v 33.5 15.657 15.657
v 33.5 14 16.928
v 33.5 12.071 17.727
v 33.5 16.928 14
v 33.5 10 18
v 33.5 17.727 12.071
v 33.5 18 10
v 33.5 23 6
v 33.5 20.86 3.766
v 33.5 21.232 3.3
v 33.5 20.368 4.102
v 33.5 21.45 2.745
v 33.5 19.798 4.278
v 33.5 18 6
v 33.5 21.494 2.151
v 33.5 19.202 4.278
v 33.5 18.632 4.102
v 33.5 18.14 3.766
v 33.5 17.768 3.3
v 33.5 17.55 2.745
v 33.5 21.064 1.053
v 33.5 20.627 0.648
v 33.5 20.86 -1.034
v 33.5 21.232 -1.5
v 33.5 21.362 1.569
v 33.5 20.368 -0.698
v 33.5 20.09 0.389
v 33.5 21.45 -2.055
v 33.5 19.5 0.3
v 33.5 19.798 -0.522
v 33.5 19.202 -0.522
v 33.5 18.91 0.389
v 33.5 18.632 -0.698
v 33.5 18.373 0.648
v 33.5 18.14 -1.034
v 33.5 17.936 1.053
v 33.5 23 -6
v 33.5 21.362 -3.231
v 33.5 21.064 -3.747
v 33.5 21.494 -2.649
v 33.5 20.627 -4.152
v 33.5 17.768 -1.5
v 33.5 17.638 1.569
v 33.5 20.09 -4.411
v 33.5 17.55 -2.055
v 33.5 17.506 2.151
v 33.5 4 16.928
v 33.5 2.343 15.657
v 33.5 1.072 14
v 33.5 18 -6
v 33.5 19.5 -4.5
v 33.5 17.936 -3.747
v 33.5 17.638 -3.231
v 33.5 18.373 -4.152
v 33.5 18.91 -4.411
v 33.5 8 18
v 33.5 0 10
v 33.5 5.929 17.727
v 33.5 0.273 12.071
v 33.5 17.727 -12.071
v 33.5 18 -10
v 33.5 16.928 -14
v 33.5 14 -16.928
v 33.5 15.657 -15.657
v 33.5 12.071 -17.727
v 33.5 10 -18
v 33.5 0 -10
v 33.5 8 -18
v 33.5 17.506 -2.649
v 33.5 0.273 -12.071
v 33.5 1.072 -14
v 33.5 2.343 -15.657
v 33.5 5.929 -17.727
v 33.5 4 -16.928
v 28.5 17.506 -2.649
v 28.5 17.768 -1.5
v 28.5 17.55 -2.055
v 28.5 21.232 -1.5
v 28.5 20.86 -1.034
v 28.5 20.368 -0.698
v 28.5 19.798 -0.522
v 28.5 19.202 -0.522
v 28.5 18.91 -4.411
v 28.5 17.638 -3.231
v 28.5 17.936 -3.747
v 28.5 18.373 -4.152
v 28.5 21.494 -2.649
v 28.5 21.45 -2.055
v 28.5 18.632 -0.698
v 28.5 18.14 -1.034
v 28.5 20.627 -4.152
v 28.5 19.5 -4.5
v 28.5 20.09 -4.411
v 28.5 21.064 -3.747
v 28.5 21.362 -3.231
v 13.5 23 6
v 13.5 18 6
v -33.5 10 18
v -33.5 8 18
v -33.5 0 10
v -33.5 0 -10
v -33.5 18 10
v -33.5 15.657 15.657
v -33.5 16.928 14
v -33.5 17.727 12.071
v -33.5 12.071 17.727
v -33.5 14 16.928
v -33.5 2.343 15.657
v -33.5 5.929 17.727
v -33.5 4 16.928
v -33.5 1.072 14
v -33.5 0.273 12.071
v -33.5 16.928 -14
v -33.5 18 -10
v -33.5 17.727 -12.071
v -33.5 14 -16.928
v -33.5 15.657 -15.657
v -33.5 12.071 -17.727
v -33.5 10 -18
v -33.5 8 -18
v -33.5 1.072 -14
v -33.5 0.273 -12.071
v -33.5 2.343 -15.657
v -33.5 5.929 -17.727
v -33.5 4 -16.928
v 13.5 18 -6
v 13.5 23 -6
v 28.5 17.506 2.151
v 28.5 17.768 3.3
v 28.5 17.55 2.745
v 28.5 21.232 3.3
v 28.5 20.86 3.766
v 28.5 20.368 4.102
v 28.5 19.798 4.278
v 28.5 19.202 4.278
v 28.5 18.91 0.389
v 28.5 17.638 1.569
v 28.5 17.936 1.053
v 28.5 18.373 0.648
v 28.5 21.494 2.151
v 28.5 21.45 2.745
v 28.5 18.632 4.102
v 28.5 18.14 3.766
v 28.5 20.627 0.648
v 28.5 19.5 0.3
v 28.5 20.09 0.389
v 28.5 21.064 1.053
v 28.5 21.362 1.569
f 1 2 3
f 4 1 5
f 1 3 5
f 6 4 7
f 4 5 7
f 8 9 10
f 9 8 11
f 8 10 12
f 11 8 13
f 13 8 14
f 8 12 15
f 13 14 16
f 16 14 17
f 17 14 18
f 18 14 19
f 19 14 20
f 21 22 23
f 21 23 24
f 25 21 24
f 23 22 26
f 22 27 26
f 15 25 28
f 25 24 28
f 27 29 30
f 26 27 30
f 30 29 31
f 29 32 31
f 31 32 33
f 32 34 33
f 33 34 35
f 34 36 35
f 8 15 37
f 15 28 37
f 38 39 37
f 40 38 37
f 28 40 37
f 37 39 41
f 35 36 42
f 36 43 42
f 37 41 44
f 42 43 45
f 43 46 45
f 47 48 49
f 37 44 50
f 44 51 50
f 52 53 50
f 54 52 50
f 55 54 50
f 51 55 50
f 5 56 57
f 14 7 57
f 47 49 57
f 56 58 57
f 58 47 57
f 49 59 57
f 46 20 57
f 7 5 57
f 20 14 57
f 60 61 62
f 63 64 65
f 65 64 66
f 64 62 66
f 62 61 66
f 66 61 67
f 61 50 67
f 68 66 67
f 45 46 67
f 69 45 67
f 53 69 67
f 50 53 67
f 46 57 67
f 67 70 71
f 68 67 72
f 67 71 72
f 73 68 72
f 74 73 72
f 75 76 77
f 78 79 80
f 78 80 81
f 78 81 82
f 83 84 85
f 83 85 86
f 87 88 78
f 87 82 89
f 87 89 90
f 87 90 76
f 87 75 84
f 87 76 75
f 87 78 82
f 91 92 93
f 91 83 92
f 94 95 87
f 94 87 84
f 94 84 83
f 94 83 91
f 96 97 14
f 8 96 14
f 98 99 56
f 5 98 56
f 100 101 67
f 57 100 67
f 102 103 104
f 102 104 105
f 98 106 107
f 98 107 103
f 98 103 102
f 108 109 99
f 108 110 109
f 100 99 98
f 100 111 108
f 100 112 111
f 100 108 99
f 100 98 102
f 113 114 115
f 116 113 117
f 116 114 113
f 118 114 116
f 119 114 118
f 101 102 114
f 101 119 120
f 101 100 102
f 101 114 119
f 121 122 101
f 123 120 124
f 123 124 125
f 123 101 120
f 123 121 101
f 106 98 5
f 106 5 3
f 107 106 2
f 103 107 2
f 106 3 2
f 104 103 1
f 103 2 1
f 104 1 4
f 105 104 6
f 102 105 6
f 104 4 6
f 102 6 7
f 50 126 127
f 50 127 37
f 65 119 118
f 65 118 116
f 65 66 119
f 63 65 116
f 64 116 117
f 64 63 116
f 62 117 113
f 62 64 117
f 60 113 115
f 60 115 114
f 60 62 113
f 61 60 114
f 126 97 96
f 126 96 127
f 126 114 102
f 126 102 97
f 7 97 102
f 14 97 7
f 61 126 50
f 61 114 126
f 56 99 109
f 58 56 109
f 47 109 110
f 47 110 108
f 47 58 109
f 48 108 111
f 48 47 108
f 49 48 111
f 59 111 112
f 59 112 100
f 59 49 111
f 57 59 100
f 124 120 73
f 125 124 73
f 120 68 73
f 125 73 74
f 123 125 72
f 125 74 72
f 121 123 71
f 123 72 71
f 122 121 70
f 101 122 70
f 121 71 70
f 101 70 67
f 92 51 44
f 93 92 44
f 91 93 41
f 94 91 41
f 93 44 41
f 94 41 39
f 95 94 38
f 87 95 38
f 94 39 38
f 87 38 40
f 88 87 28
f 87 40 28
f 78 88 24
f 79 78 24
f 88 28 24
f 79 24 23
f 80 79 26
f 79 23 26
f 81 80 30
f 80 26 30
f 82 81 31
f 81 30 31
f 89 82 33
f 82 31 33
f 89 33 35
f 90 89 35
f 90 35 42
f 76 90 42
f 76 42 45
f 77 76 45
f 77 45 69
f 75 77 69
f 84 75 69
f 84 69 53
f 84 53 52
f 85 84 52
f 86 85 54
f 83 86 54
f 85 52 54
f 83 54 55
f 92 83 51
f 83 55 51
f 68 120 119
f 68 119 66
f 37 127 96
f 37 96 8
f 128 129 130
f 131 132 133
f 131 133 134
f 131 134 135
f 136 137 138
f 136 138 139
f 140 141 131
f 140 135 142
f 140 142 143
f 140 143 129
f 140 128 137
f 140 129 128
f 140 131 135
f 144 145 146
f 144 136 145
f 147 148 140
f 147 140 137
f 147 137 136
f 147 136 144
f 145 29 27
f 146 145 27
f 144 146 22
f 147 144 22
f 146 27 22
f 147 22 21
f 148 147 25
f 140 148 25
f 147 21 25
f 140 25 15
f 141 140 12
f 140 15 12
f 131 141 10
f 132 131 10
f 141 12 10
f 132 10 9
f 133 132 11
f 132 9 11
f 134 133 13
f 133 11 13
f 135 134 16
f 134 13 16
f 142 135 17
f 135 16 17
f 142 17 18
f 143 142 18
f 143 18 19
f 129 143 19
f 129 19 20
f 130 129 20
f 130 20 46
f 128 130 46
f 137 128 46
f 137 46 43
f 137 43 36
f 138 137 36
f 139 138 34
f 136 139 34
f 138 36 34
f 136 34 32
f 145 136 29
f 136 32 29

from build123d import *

# Parameters (mm, degrees)
SKETCH_1_W          = 67
SKETCH_1_H          = 36
EXTRUDE_1_DEPTH     = 18
SKETCH_2_W          = 20
SKETCH_2_H          = 12
EXTRUDE_2_DEPTH     = 5
FILLET_1_R          = 8
SKETCH_3_R          = 2
CUT_EXTRUDE_1_DEPTH = 5


with BuildPart() as part:
    # 草图1 → 凸台-拉伸1 (new body)
    with BuildSketch(Plane(origin=(0, 0, 0), x_dir=(1, 0, 0), z_dir=(0, 1, 0))):
        Rectangle(SKETCH_1_W, SKETCH_1_H)
    extrude(amount=EXTRUDE_1_DEPTH)

    # 草图2 → 凸台-拉伸2 (add)
    with BuildSketch(Plane(origin=(0, 18, 0), x_dir=(1, 0, 0), z_dir=(0, 1, 0))):
        with Locations((23.5, 0)):
            Rectangle(SKETCH_2_W, SKETCH_2_H)
    extrude(amount=EXTRUDE_2_DEPTH)

    # 圆角1
    fillet_1_edges = [part.edges().sort_by_distance(p)[0] for p in [
        (0, 18, 18),
        (0, 0, 18),
        (0, 0, -18),
        (0, 18, -18),
    ]]
    fillet(fillet_1_edges, radius=FILLET_1_R)

    # 草图3 → 切除-拉伸1 (cut)
    with BuildSketch(Plane(origin=(33.5, 0, 0), x_dir=(0, 0, -1), z_dir=(1, 0, 0))):
        with Locations((2.5, 19.5)):
            Circle(SKETCH_3_R)
        with Locations((-2.3, 19.5)):
            Circle(SKETCH_3_R)
    extrude(amount=-CUT_EXTRUDE_1_DEPTH, mode=Mode.SUBTRACT)


solid = part.part
